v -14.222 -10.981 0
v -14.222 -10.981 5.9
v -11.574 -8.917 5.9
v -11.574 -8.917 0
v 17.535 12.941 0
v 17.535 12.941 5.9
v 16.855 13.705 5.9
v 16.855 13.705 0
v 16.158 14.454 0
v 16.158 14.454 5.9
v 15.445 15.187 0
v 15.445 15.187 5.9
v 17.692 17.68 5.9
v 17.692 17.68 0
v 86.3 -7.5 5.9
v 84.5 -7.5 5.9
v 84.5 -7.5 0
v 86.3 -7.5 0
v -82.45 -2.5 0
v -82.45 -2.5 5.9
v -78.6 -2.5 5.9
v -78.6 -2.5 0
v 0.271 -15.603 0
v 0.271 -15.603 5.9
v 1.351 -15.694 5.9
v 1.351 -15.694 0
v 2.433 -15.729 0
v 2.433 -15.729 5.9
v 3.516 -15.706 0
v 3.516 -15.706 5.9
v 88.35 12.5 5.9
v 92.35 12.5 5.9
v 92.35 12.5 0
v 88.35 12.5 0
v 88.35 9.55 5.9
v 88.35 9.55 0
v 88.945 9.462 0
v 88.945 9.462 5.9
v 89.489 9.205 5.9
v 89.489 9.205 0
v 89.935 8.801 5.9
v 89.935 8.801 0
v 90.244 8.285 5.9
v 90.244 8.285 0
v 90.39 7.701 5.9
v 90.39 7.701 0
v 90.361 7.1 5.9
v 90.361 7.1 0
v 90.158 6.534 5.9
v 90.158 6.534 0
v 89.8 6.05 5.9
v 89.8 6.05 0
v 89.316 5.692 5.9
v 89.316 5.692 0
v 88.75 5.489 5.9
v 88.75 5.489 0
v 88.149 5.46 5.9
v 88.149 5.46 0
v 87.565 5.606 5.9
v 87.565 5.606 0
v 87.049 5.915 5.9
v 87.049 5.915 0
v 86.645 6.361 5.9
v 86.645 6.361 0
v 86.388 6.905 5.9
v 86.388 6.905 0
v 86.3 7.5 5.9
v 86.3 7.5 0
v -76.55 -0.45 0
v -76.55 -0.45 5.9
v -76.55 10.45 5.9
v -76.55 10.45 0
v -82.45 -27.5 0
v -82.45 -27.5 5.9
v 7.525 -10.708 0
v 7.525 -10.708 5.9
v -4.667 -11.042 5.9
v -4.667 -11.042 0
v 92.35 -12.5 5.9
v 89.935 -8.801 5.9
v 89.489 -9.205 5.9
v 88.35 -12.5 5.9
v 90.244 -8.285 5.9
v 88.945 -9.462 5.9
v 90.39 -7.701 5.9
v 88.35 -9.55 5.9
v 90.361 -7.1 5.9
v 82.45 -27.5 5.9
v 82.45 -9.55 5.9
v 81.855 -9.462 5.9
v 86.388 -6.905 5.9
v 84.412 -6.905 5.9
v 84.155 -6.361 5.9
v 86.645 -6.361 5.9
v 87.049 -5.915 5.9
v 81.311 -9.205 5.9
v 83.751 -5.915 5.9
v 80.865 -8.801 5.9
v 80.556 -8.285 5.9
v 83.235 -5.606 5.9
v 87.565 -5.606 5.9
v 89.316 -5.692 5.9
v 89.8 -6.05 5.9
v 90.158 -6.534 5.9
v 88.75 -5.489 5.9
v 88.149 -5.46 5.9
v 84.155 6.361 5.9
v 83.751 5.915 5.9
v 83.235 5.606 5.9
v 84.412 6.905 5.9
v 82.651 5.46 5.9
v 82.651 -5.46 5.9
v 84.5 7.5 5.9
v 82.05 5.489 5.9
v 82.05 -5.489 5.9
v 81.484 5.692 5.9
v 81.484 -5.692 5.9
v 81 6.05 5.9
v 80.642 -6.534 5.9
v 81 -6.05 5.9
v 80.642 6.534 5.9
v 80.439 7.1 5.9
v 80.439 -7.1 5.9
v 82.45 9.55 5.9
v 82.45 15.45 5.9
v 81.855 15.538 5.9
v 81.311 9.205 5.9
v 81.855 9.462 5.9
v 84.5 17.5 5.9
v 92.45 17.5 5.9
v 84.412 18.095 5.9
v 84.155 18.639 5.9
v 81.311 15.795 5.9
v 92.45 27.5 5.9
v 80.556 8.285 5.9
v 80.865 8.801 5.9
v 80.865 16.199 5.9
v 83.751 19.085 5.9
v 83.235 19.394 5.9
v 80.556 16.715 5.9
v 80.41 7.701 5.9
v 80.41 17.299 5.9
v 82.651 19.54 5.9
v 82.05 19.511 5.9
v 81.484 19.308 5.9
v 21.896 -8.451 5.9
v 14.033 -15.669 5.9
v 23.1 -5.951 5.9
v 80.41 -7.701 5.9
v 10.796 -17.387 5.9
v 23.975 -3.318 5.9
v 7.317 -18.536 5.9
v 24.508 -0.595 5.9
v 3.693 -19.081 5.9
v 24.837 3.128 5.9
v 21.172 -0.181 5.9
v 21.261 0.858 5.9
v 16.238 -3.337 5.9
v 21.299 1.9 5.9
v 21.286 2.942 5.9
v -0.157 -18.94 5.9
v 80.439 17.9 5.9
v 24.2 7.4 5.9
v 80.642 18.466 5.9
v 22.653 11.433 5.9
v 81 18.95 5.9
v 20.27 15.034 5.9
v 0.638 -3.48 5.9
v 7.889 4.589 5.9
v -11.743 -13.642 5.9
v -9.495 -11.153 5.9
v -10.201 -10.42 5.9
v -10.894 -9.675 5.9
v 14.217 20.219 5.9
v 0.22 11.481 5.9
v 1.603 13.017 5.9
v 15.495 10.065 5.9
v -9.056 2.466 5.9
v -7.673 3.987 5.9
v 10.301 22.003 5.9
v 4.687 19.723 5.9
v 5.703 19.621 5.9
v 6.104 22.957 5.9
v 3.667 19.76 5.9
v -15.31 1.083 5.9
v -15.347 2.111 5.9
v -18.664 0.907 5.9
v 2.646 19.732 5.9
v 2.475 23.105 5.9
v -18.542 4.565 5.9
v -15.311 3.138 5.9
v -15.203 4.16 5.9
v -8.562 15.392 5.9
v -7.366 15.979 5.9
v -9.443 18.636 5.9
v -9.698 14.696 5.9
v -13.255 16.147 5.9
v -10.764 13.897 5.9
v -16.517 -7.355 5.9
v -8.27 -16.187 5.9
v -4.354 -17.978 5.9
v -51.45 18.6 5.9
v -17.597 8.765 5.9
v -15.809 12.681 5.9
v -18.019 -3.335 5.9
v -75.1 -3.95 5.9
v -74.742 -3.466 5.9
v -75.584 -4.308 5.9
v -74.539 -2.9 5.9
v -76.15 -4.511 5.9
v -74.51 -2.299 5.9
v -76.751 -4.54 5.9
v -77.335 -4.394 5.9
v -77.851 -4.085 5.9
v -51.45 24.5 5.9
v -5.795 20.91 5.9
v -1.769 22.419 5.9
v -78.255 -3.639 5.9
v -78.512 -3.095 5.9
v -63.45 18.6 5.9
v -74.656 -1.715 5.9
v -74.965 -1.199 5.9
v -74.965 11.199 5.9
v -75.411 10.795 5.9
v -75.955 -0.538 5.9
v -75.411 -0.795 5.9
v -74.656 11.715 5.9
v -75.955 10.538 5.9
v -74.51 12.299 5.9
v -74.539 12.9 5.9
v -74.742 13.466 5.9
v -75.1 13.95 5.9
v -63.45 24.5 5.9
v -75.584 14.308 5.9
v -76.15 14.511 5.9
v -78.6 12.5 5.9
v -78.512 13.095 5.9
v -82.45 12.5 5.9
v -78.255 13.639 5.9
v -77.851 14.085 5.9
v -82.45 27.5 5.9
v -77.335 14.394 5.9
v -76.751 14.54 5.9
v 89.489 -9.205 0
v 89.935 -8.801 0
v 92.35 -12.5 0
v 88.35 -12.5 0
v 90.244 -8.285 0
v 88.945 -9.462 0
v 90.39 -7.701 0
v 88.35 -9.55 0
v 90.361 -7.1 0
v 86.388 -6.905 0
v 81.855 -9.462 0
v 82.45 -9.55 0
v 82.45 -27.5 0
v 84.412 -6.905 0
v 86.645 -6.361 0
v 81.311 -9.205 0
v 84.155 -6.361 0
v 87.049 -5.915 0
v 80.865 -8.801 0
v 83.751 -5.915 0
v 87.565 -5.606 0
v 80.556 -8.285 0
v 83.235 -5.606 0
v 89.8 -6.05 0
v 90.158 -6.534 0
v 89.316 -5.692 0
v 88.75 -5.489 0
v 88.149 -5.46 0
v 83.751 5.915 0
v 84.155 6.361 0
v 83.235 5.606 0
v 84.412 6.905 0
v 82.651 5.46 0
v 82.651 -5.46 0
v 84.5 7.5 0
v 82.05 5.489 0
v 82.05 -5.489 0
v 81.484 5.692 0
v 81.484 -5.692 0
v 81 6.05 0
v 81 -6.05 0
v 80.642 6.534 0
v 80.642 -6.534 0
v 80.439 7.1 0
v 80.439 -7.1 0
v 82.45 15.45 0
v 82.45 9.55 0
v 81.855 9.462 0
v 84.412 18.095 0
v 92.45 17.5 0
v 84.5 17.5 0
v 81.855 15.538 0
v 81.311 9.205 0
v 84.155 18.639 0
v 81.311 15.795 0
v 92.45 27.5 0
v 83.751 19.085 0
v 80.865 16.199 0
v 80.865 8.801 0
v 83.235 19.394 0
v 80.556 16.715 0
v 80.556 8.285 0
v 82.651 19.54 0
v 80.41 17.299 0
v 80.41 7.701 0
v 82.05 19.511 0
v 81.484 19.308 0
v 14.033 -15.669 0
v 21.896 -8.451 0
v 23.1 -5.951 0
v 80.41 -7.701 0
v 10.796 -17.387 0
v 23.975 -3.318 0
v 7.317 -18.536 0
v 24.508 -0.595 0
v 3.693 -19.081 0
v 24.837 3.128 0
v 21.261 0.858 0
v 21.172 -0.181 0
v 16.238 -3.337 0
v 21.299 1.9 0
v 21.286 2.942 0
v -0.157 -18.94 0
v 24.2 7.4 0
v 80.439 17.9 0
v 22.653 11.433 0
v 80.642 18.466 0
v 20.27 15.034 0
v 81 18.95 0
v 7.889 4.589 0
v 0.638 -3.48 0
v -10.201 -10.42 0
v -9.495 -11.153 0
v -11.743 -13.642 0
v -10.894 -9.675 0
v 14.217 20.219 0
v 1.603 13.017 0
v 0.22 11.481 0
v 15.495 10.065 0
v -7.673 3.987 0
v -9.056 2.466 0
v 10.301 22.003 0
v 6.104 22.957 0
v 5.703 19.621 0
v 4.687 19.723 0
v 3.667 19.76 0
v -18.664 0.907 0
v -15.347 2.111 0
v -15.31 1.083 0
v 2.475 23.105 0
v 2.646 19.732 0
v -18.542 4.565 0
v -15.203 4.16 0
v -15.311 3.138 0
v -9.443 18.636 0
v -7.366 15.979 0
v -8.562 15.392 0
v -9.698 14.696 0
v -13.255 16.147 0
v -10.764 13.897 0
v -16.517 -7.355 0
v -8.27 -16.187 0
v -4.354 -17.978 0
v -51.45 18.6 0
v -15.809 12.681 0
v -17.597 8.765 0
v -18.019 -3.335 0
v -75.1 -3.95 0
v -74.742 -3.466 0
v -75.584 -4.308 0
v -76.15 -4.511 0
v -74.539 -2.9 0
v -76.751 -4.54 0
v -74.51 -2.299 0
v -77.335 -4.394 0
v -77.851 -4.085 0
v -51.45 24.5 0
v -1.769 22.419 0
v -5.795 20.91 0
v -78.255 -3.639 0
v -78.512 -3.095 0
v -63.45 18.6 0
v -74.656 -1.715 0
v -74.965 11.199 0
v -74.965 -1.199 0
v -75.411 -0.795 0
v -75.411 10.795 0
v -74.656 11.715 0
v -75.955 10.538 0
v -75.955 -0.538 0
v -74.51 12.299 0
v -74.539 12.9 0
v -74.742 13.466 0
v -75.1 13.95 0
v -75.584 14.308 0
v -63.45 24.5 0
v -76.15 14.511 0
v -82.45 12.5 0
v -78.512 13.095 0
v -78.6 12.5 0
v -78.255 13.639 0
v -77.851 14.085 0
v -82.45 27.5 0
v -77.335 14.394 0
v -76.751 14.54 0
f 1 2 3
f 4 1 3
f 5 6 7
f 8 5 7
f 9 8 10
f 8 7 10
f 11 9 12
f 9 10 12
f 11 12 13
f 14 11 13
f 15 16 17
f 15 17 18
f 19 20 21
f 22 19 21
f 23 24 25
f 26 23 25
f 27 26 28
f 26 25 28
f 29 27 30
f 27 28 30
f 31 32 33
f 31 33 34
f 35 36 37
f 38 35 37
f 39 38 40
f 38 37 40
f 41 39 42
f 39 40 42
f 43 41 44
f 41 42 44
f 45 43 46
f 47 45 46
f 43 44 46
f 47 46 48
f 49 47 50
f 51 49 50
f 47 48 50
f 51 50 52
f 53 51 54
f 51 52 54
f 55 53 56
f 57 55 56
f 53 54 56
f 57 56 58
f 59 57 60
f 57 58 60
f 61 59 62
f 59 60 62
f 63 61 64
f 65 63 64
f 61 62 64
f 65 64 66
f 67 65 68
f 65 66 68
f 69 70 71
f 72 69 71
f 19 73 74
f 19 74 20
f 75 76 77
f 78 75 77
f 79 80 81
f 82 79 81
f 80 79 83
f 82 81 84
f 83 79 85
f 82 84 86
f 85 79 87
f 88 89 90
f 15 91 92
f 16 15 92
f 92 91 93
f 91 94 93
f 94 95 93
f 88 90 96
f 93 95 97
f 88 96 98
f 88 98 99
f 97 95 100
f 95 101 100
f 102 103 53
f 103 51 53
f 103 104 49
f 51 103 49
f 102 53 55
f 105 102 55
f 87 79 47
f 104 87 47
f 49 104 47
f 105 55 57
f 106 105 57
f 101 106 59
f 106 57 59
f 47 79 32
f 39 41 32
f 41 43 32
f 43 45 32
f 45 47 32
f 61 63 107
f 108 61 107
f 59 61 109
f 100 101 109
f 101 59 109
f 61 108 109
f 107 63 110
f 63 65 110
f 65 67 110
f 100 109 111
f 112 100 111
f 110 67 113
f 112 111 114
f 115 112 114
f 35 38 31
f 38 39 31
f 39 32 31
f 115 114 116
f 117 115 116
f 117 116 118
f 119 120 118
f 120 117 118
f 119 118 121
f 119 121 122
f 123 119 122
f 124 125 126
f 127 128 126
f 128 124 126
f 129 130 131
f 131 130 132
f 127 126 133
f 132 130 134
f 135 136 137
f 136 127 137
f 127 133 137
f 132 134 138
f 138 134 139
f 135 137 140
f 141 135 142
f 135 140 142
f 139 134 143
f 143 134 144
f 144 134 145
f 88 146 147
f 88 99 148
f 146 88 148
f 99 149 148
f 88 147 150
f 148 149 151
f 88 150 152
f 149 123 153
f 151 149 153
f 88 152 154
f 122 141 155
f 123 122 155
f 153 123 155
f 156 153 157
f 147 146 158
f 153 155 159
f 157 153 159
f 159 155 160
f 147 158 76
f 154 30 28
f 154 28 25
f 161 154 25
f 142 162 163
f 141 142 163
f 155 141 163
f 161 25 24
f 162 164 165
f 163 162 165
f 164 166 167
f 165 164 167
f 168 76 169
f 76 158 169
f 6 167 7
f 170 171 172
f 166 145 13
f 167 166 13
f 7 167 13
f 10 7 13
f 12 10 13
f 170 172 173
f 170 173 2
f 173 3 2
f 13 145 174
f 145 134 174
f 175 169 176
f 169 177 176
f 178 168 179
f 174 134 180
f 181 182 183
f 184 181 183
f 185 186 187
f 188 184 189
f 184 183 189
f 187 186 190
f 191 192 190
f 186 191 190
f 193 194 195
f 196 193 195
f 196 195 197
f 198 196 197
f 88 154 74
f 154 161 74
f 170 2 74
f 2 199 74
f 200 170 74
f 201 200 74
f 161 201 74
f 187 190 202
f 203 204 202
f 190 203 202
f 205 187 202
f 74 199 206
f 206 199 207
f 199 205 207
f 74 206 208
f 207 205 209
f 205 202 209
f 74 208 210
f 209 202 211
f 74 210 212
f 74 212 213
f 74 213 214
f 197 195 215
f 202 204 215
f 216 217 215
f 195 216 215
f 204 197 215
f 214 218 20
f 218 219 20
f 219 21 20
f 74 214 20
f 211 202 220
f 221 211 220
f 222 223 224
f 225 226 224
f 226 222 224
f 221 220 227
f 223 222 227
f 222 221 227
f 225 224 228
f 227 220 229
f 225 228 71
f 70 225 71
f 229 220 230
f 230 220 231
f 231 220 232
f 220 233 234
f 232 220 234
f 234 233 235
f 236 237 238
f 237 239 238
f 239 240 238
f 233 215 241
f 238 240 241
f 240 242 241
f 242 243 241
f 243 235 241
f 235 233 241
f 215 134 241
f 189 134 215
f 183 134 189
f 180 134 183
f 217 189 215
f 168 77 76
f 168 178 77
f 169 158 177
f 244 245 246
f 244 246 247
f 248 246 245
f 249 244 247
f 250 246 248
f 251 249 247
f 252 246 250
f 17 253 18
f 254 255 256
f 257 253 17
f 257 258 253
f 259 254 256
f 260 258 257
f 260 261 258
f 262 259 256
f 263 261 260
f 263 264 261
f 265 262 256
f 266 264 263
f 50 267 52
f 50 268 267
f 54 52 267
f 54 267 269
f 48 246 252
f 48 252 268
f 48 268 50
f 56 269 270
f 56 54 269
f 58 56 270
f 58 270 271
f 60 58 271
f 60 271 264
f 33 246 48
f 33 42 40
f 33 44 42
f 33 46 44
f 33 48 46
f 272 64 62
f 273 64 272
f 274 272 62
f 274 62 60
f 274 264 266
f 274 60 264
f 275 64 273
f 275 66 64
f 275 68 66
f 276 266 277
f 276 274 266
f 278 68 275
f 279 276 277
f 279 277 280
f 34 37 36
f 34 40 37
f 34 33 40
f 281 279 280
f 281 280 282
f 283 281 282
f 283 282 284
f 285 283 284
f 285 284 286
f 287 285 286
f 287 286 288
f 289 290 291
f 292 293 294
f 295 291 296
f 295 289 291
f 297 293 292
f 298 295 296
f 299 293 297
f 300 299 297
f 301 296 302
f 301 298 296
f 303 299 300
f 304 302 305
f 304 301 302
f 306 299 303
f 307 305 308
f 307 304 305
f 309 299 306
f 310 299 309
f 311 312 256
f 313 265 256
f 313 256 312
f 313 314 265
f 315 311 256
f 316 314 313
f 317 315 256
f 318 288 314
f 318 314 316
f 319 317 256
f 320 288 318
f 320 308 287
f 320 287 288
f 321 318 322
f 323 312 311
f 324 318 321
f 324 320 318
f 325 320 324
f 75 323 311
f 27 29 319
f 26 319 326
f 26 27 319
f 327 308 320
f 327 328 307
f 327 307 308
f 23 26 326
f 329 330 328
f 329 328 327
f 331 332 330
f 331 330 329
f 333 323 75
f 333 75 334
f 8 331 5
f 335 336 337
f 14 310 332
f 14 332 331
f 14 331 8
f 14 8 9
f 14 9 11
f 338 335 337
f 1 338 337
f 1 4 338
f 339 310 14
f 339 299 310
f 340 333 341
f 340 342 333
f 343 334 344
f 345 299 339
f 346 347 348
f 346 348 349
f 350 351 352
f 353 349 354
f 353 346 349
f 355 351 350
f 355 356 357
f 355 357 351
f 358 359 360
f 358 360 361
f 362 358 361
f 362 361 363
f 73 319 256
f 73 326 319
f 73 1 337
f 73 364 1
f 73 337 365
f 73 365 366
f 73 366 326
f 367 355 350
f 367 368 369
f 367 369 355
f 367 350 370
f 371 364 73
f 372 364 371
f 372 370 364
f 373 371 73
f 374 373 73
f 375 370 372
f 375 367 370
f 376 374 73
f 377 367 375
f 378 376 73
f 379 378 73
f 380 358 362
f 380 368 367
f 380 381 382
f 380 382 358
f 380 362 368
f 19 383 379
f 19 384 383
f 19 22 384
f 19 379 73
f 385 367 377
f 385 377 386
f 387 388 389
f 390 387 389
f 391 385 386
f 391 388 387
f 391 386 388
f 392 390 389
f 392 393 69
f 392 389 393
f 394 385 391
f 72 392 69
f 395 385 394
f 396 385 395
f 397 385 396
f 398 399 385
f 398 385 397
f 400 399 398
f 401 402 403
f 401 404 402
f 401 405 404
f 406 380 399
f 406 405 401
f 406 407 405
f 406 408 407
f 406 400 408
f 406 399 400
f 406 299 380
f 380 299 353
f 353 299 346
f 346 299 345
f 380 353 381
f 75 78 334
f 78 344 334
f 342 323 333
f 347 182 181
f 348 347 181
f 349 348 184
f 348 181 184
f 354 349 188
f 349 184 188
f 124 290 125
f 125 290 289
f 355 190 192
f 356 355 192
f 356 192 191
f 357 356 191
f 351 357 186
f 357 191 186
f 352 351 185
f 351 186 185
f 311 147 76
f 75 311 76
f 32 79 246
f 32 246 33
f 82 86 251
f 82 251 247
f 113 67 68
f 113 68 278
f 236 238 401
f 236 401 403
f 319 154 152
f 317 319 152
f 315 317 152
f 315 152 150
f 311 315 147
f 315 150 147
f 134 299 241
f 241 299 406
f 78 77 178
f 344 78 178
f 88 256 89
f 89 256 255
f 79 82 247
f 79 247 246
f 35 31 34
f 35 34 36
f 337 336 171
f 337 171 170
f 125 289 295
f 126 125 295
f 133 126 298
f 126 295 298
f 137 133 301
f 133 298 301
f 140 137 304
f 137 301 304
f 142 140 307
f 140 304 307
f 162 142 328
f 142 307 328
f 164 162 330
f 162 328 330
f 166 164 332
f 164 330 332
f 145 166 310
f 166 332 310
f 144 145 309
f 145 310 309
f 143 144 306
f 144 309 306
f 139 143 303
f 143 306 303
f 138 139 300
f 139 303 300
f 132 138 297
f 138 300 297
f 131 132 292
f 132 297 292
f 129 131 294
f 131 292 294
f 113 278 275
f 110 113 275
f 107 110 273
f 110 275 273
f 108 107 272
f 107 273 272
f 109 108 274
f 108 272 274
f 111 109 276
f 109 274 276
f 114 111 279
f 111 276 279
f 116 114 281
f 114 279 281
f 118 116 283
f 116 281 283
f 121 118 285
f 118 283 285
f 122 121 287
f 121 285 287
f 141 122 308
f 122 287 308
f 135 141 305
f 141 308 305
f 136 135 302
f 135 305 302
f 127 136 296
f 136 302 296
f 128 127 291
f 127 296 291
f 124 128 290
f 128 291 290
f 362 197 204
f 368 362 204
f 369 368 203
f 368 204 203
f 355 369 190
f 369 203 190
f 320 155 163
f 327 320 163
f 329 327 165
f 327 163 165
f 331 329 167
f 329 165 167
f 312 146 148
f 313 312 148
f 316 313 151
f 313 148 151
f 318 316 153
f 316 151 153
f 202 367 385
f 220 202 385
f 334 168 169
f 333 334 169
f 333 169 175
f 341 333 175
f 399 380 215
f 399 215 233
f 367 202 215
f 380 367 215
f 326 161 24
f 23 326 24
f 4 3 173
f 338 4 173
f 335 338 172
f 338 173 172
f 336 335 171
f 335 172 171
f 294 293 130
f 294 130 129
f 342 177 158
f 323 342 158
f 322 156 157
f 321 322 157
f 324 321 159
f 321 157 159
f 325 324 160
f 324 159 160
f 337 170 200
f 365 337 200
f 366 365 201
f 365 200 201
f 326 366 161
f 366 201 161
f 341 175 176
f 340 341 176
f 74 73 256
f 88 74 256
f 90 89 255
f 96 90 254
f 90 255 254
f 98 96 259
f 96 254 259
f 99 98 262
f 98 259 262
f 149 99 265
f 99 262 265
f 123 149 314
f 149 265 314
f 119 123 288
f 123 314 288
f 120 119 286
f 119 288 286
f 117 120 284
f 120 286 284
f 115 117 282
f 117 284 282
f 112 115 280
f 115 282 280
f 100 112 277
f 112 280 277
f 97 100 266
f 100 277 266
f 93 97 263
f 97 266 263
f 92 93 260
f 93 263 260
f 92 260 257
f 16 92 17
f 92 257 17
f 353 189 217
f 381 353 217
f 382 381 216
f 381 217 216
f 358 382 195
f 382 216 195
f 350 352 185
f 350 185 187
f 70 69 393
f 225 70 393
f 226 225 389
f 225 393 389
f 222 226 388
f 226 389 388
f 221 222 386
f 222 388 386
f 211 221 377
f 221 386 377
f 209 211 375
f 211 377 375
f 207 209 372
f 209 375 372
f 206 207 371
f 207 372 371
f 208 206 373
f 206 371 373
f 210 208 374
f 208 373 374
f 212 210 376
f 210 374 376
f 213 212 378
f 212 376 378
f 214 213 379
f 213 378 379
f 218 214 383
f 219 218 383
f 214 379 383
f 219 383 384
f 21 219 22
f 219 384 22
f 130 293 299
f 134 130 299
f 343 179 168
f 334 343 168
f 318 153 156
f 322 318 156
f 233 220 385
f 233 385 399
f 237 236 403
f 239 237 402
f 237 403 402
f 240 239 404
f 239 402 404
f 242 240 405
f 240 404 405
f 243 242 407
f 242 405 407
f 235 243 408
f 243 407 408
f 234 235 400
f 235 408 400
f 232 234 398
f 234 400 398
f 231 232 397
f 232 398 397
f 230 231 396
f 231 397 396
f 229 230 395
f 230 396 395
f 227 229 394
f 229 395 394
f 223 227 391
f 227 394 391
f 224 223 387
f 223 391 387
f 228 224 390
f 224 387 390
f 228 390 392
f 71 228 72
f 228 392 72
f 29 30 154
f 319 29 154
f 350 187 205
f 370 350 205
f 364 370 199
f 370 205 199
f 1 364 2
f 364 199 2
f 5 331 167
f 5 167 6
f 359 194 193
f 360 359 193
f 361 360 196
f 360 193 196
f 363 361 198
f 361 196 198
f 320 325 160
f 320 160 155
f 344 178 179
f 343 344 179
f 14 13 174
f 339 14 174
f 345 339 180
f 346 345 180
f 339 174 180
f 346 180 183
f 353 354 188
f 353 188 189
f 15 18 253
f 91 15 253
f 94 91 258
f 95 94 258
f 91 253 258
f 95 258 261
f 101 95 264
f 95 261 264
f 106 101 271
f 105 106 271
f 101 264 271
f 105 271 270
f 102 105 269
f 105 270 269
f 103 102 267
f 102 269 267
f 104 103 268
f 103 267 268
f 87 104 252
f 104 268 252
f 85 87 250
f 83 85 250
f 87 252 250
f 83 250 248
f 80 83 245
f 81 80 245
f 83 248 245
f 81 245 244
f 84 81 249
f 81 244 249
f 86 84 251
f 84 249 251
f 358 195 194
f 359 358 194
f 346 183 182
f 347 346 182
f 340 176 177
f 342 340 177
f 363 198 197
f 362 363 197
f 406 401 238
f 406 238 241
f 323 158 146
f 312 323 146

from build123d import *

# Parameters (mm, degrees)
SKETCH1_W           = 164.9
SKETCH1_H           = 55
BOSS_EXTRUDE1_DEPTH = 5.9
SKETCH2_W           = 5.9
SKETCH2_H           = 15
CUT_EXTRUDE1_DEPTH  = 6.9
BOSS_EXTRUDE2_DEPTH = 5.9
CUT_EXTRUDE2_DEPTH  = 10
SKETCH5_W           = 10
SKETCH5_H           = 10
BOSS_EXTRUDE3_DEPTH = 5.9
CUT_EXTRUDE3_REACH  = 7.9
SKETCH6_R           = 2.05
CUT_EXTRUDE4_REACH  = 7.9
SKETCH7_W           = 12
SKETCH7_H           = 5.9


with BuildPart() as part:
    # Sketch1 → Boss-Extrude1 (new body)
    with BuildSketch(Plane.XY):
        Rectangle(SKETCH1_W, SKETCH1_H)
    extrude(amount=BOSS_EXTRUDE1_DEPTH)

    # Sketch2 → Cut-Extrude1 (cut, through all)
    with BuildSketch(Plane.XY.offset(5.9)):
        with Locations((-79.5, 5)):
            Rectangle(SKETCH2_W, SKETCH2_H)
    extrude(amount=-CUT_EXTRUDE1_DEPTH, mode=Mode.SUBTRACT)

    # Sketch3 → Boss-Extrude2 (add)
    with BuildSketch(Plane.XY.offset(5.9)):
        Polygon((82.45, -7.5), (88.35, -7.5), (88.35, -12.5), (92.35, -12.5), (92.35, 12.5), (88.35, 12.5), (88.35, 7.5), (82.45, 7.5), align=None)
    extrude(amount=-BOSS_EXTRUDE2_DEPTH)

    # Sketch4 → Cut-Extrude2 (cut)
    with BuildSketch(Plane.XY.offset(5.9)):
        with BuildLine():
            Line((3.51583171, -15.706229716), (3.692822505, -19.080784973))
            ThreePointArc((3.692822505, -19.080784973), (9.080825588, -18.035079597), (14.033003188, -15.668644733))
            Line((14.033003188, -15.668644733), (7.525249631, -10.707966449))
            Line((7.525249631, -10.707966449), (-4.667323255, -11.041732232))
            Line((-4.667323255, -11.041732232), (-9.056316648, 2.465721032))
            Line((-9.056316648, 2.465721032), (-7.672540361, 3.987452797))
            Line((-7.672540361, 3.987452797), (0.63828327, -3.480150804))
            Line((0.63828327, -3.480150804), (7.889093057, 4.589420993))
            Line((7.889093057, 4.589420993), (0.219729645, 11.480963368))
            Line((0.219729645, 11.480963368), (1.603052795, 13.017301391))
            Line((1.603052795, 13.017301391), (15.495445969, 10.065059871))
            Line((15.495445969, 10.065059871), (16.237659976, -3.337384453))
            Line((16.237659976, -3.337384453), (21.895941701, -8.451220184))
            ThreePointArc((21.895941701, -8.451220184), (23.579573726, -4.648525456), (24.507536721, -0.594639829))
            Line((24.507536721, -0.594639829), (21.171770806, -0.180639971))
            ThreePointArc((21.171770806, -0.180639971), (21.286498935, 1.378538101), (21.285888417, 2.941931343))
            Line((21.285888417, 2.941931343), (24.837258291, 3.128195824))
            ThreePointArc((24.837258291, 3.128195824), (23.536690781, 9.458573353), (20.269548114, 15.034497878))
            Line((20.269548114, 15.034497878), (17.535016414, 12.941488009))
            ThreePointArc((17.535016414, 12.941488009), (16.508769514, 14.081533134), (15.445096221, 15.186741129))
            Line((15.445096221, 15.186741129), (17.692052457, 17.680150482))
            ThreePointArc((17.692052457, 17.680150482), (12.304554027, 21.210935864), (6.104308905, 22.956944215))
            Line((6.104308905, 22.956944215), (5.70284553, 19.6211861))
            ThreePointArc((5.70284553, 19.6211861), (4.176993745, 19.749298528), (2.645876068, 19.73154678))
            Line((2.645876068, 19.73154678), (2.474568352, 23.105152619))
            ThreePointArc((2.474568352, 23.105152619), (-3.819532601, 21.764454936), (-9.443176471, 18.635907879))
            Line((-9.443176471, 18.635907879), (-7.36611055, 15.97938168))
            ThreePointArc((-7.36611055, 15.97938168), (-9.138032671, 15.057329352), (-10.764172697, 13.897347837))
            Line((-10.764172697, 13.897347837), (-13.255215364, 16.14691078))
            ThreePointArc((-13.255215364, 16.14691078), (-16.804652941, 10.7695067), (-18.541993583, 4.564941506))
            Line((-18.541993583, 4.564941506), (-15.203305308, 4.160483172))
            ThreePointArc((-15.203305308, 4.160483172), (-15.337848427, 2.624728095), (-15.310082988, 1.083340867))
            Line((-15.310082988, 1.083340867), (-18.663730537, 0.907446652))
            ThreePointArc((-18.663730537, 0.907446652), (-17.372056658, -5.384049821), (-14.221680713, -10.981056224))
            Line((-14.221680713, -10.981056224), (-11.574159014, -8.917273625))
            ThreePointArc((-11.574159014, -8.917273625), (-10.549530454, -10.048759249), (-9.495391581, -11.15280392))
            Line((-9.495391581, -11.15280392), (-11.74257315, -13.641863724))
            ThreePointArc((-11.74257315, -13.641863724), (-6.357210629, -17.182483384), (-0.156549988, -18.940301546))
            Line((-0.156549988, -18.940301546), (0.271448667, -15.602569205))
            ThreePointArc((0.271448667, -15.602569205), (1.891578011, -15.718941802), (3.51583171, -15.706229716))
        make_face()
    extrude(amount=-CUT_EXTRUDE2_DEPTH, mode=Mode.SUBTRACT)

    # Sketch5 → Boss-Extrude3 (add)
    with BuildSketch(Plane(origin=(0, 0, 0), x_dir=(-1, 0, 0), z_dir=(0, 0, -1))):
        with Locations((-87.45, 22.5)):
            Rectangle(SKETCH5_W, SKETCH5_H)
    extrude(amount=-BOSS_EXTRUDE3_DEPTH)

    # Sketch6 → Cut-Extrude3 (cut, up to next)
    with BuildSketch(Plane(origin=(0, 0, 0), x_dir=(-1, 0, 0), z_dir=(0, 0, -1)), mode=Mode.PRIVATE) as cut_extrude3_sk1:
        with Locations((-82.45, -7.5)):
            Circle(SKETCH6_R)
    cut_extrude3_tool1 = extrude(cut_extrude3_sk1.sketch, amount=-CUT_EXTRUDE3_REACH, mode=Mode.PRIVATE) & part.part
    add(cut_extrude3_tool1.solids().sort_by_distance((82.45, -7.5, 0))[0], mode=Mode.SUBTRACT)
    # Sketch6 → Cut-Extrude3 (cut, up to next)
    with BuildSketch(Plane(origin=(0, 0, 0), x_dir=(-1, 0, 0), z_dir=(0, 0, -1)), mode=Mode.PRIVATE) as cut_extrude3_sk2:
        with Locations((-88.35, -7.5)):
            Circle(SKETCH6_R)
    cut_extrude3_tool2 = extrude(cut_extrude3_sk2.sketch, amount=-CUT_EXTRUDE3_REACH, mode=Mode.PRIVATE) & part.part
    add(cut_extrude3_tool2.solids().sort_by_distance((88.35, -7.5, 0))[0], mode=Mode.SUBTRACT)
    # Sketch6 → Cut-Extrude3 (cut, up to next)
    with BuildSketch(Plane(origin=(0, 0, 0), x_dir=(-1, 0, 0), z_dir=(0, 0, -1)), mode=Mode.PRIVATE) as cut_extrude3_sk3:
        with Locations((-88.35, 7.5)):
            Circle(SKETCH6_R)
    cut_extrude3_tool3 = extrude(cut_extrude3_sk3.sketch, amount=-CUT_EXTRUDE3_REACH, mode=Mode.PRIVATE) & part.part
    add(cut_extrude3_tool3.solids().sort_by_distance((88.35, 7.5, 0))[0], mode=Mode.SUBTRACT)
    # Sketch6 → Cut-Extrude3 (cut, up to next)
    with BuildSketch(Plane(origin=(0, 0, 0), x_dir=(-1, 0, 0), z_dir=(0, 0, -1)), mode=Mode.PRIVATE) as cut_extrude3_sk4:
        with Locations((-82.45, 7.5)):
            Circle(SKETCH6_R)
    cut_extrude3_tool4 = extrude(cut_extrude3_sk4.sketch, amount=-CUT_EXTRUDE3_REACH, mode=Mode.PRIVATE) & part.part
    add(cut_extrude3_tool4.solids().sort_by_distance((82.45, 7.5, 0))[0], mode=Mode.SUBTRACT)
    # Sketch6 → Cut-Extrude3 (cut, up to next)
    with BuildSketch(Plane(origin=(0, 0, 0), x_dir=(-1, 0, 0), z_dir=(0, 0, -1)), mode=Mode.PRIVATE) as cut_extrude3_sk5:
        with Locations((-82.45, 17.5)):
            Circle(SKETCH6_R)
    cut_extrude3_tool5 = extrude(cut_extrude3_sk5.sketch, amount=-CUT_EXTRUDE3_REACH, mode=Mode.PRIVATE) & part.part
    add(cut_extrude3_tool5.solids().sort_by_distance((82.45, 17.5, 0))[0], mode=Mode.SUBTRACT)
    # Sketch6 → Cut-Extrude3 (cut, up to next)
    with BuildSketch(Plane(origin=(0, 0, 0), x_dir=(-1, 0, 0), z_dir=(0, 0, -1)), mode=Mode.PRIVATE) as cut_extrude3_sk6:
        with Locations((76.55, 12.5)):
            Circle(SKETCH6_R)
    cut_extrude3_tool6 = extrude(cut_extrude3_sk6.sketch, amount=-CUT_EXTRUDE3_REACH, mode=Mode.PRIVATE) & part.part
    add(cut_extrude3_tool6.solids().sort_by_distance((-76.55, 12.5, 0))[0], mode=Mode.SUBTRACT)
    # Sketch6 → Cut-Extrude3 (cut, up to next)
    with BuildSketch(Plane(origin=(0, 0, 0), x_dir=(-1, 0, 0), z_dir=(0, 0, -1)), mode=Mode.PRIVATE) as cut_extrude3_sk7:
        with Locations((76.55, -2.5)):
            Circle(SKETCH6_R)
    cut_extrude3_tool7 = extrude(cut_extrude3_sk7.sketch, amount=-CUT_EXTRUDE3_REACH, mode=Mode.PRIVATE) & part.part
    add(cut_extrude3_tool7.solids().sort_by_distance((-76.55, -2.5, 0))[0], mode=Mode.SUBTRACT)

    # Sketch7 → Cut-Extrude4 (cut, up to next)
    with BuildSketch(Plane(origin=(0, 0, 0), x_dir=(-1, 0, 0), z_dir=(0, 0, -1)), mode=Mode.PRIVATE) as cut_extrude4_sk1:
        with Locations((57.45, 21.55)):
            Rectangle(SKETCH7_W, SKETCH7_H)
    cut_extrude4_tool1 = extrude(cut_extrude4_sk1.sketch, amount=-CUT_EXTRUDE4_REACH, mode=Mode.PRIVATE) & part.part
    add(cut_extrude4_tool1.solids().sort_by_distance((-57.45, 21.55, 0))[0], mode=Mode.SUBTRACT)


solid = part.part
